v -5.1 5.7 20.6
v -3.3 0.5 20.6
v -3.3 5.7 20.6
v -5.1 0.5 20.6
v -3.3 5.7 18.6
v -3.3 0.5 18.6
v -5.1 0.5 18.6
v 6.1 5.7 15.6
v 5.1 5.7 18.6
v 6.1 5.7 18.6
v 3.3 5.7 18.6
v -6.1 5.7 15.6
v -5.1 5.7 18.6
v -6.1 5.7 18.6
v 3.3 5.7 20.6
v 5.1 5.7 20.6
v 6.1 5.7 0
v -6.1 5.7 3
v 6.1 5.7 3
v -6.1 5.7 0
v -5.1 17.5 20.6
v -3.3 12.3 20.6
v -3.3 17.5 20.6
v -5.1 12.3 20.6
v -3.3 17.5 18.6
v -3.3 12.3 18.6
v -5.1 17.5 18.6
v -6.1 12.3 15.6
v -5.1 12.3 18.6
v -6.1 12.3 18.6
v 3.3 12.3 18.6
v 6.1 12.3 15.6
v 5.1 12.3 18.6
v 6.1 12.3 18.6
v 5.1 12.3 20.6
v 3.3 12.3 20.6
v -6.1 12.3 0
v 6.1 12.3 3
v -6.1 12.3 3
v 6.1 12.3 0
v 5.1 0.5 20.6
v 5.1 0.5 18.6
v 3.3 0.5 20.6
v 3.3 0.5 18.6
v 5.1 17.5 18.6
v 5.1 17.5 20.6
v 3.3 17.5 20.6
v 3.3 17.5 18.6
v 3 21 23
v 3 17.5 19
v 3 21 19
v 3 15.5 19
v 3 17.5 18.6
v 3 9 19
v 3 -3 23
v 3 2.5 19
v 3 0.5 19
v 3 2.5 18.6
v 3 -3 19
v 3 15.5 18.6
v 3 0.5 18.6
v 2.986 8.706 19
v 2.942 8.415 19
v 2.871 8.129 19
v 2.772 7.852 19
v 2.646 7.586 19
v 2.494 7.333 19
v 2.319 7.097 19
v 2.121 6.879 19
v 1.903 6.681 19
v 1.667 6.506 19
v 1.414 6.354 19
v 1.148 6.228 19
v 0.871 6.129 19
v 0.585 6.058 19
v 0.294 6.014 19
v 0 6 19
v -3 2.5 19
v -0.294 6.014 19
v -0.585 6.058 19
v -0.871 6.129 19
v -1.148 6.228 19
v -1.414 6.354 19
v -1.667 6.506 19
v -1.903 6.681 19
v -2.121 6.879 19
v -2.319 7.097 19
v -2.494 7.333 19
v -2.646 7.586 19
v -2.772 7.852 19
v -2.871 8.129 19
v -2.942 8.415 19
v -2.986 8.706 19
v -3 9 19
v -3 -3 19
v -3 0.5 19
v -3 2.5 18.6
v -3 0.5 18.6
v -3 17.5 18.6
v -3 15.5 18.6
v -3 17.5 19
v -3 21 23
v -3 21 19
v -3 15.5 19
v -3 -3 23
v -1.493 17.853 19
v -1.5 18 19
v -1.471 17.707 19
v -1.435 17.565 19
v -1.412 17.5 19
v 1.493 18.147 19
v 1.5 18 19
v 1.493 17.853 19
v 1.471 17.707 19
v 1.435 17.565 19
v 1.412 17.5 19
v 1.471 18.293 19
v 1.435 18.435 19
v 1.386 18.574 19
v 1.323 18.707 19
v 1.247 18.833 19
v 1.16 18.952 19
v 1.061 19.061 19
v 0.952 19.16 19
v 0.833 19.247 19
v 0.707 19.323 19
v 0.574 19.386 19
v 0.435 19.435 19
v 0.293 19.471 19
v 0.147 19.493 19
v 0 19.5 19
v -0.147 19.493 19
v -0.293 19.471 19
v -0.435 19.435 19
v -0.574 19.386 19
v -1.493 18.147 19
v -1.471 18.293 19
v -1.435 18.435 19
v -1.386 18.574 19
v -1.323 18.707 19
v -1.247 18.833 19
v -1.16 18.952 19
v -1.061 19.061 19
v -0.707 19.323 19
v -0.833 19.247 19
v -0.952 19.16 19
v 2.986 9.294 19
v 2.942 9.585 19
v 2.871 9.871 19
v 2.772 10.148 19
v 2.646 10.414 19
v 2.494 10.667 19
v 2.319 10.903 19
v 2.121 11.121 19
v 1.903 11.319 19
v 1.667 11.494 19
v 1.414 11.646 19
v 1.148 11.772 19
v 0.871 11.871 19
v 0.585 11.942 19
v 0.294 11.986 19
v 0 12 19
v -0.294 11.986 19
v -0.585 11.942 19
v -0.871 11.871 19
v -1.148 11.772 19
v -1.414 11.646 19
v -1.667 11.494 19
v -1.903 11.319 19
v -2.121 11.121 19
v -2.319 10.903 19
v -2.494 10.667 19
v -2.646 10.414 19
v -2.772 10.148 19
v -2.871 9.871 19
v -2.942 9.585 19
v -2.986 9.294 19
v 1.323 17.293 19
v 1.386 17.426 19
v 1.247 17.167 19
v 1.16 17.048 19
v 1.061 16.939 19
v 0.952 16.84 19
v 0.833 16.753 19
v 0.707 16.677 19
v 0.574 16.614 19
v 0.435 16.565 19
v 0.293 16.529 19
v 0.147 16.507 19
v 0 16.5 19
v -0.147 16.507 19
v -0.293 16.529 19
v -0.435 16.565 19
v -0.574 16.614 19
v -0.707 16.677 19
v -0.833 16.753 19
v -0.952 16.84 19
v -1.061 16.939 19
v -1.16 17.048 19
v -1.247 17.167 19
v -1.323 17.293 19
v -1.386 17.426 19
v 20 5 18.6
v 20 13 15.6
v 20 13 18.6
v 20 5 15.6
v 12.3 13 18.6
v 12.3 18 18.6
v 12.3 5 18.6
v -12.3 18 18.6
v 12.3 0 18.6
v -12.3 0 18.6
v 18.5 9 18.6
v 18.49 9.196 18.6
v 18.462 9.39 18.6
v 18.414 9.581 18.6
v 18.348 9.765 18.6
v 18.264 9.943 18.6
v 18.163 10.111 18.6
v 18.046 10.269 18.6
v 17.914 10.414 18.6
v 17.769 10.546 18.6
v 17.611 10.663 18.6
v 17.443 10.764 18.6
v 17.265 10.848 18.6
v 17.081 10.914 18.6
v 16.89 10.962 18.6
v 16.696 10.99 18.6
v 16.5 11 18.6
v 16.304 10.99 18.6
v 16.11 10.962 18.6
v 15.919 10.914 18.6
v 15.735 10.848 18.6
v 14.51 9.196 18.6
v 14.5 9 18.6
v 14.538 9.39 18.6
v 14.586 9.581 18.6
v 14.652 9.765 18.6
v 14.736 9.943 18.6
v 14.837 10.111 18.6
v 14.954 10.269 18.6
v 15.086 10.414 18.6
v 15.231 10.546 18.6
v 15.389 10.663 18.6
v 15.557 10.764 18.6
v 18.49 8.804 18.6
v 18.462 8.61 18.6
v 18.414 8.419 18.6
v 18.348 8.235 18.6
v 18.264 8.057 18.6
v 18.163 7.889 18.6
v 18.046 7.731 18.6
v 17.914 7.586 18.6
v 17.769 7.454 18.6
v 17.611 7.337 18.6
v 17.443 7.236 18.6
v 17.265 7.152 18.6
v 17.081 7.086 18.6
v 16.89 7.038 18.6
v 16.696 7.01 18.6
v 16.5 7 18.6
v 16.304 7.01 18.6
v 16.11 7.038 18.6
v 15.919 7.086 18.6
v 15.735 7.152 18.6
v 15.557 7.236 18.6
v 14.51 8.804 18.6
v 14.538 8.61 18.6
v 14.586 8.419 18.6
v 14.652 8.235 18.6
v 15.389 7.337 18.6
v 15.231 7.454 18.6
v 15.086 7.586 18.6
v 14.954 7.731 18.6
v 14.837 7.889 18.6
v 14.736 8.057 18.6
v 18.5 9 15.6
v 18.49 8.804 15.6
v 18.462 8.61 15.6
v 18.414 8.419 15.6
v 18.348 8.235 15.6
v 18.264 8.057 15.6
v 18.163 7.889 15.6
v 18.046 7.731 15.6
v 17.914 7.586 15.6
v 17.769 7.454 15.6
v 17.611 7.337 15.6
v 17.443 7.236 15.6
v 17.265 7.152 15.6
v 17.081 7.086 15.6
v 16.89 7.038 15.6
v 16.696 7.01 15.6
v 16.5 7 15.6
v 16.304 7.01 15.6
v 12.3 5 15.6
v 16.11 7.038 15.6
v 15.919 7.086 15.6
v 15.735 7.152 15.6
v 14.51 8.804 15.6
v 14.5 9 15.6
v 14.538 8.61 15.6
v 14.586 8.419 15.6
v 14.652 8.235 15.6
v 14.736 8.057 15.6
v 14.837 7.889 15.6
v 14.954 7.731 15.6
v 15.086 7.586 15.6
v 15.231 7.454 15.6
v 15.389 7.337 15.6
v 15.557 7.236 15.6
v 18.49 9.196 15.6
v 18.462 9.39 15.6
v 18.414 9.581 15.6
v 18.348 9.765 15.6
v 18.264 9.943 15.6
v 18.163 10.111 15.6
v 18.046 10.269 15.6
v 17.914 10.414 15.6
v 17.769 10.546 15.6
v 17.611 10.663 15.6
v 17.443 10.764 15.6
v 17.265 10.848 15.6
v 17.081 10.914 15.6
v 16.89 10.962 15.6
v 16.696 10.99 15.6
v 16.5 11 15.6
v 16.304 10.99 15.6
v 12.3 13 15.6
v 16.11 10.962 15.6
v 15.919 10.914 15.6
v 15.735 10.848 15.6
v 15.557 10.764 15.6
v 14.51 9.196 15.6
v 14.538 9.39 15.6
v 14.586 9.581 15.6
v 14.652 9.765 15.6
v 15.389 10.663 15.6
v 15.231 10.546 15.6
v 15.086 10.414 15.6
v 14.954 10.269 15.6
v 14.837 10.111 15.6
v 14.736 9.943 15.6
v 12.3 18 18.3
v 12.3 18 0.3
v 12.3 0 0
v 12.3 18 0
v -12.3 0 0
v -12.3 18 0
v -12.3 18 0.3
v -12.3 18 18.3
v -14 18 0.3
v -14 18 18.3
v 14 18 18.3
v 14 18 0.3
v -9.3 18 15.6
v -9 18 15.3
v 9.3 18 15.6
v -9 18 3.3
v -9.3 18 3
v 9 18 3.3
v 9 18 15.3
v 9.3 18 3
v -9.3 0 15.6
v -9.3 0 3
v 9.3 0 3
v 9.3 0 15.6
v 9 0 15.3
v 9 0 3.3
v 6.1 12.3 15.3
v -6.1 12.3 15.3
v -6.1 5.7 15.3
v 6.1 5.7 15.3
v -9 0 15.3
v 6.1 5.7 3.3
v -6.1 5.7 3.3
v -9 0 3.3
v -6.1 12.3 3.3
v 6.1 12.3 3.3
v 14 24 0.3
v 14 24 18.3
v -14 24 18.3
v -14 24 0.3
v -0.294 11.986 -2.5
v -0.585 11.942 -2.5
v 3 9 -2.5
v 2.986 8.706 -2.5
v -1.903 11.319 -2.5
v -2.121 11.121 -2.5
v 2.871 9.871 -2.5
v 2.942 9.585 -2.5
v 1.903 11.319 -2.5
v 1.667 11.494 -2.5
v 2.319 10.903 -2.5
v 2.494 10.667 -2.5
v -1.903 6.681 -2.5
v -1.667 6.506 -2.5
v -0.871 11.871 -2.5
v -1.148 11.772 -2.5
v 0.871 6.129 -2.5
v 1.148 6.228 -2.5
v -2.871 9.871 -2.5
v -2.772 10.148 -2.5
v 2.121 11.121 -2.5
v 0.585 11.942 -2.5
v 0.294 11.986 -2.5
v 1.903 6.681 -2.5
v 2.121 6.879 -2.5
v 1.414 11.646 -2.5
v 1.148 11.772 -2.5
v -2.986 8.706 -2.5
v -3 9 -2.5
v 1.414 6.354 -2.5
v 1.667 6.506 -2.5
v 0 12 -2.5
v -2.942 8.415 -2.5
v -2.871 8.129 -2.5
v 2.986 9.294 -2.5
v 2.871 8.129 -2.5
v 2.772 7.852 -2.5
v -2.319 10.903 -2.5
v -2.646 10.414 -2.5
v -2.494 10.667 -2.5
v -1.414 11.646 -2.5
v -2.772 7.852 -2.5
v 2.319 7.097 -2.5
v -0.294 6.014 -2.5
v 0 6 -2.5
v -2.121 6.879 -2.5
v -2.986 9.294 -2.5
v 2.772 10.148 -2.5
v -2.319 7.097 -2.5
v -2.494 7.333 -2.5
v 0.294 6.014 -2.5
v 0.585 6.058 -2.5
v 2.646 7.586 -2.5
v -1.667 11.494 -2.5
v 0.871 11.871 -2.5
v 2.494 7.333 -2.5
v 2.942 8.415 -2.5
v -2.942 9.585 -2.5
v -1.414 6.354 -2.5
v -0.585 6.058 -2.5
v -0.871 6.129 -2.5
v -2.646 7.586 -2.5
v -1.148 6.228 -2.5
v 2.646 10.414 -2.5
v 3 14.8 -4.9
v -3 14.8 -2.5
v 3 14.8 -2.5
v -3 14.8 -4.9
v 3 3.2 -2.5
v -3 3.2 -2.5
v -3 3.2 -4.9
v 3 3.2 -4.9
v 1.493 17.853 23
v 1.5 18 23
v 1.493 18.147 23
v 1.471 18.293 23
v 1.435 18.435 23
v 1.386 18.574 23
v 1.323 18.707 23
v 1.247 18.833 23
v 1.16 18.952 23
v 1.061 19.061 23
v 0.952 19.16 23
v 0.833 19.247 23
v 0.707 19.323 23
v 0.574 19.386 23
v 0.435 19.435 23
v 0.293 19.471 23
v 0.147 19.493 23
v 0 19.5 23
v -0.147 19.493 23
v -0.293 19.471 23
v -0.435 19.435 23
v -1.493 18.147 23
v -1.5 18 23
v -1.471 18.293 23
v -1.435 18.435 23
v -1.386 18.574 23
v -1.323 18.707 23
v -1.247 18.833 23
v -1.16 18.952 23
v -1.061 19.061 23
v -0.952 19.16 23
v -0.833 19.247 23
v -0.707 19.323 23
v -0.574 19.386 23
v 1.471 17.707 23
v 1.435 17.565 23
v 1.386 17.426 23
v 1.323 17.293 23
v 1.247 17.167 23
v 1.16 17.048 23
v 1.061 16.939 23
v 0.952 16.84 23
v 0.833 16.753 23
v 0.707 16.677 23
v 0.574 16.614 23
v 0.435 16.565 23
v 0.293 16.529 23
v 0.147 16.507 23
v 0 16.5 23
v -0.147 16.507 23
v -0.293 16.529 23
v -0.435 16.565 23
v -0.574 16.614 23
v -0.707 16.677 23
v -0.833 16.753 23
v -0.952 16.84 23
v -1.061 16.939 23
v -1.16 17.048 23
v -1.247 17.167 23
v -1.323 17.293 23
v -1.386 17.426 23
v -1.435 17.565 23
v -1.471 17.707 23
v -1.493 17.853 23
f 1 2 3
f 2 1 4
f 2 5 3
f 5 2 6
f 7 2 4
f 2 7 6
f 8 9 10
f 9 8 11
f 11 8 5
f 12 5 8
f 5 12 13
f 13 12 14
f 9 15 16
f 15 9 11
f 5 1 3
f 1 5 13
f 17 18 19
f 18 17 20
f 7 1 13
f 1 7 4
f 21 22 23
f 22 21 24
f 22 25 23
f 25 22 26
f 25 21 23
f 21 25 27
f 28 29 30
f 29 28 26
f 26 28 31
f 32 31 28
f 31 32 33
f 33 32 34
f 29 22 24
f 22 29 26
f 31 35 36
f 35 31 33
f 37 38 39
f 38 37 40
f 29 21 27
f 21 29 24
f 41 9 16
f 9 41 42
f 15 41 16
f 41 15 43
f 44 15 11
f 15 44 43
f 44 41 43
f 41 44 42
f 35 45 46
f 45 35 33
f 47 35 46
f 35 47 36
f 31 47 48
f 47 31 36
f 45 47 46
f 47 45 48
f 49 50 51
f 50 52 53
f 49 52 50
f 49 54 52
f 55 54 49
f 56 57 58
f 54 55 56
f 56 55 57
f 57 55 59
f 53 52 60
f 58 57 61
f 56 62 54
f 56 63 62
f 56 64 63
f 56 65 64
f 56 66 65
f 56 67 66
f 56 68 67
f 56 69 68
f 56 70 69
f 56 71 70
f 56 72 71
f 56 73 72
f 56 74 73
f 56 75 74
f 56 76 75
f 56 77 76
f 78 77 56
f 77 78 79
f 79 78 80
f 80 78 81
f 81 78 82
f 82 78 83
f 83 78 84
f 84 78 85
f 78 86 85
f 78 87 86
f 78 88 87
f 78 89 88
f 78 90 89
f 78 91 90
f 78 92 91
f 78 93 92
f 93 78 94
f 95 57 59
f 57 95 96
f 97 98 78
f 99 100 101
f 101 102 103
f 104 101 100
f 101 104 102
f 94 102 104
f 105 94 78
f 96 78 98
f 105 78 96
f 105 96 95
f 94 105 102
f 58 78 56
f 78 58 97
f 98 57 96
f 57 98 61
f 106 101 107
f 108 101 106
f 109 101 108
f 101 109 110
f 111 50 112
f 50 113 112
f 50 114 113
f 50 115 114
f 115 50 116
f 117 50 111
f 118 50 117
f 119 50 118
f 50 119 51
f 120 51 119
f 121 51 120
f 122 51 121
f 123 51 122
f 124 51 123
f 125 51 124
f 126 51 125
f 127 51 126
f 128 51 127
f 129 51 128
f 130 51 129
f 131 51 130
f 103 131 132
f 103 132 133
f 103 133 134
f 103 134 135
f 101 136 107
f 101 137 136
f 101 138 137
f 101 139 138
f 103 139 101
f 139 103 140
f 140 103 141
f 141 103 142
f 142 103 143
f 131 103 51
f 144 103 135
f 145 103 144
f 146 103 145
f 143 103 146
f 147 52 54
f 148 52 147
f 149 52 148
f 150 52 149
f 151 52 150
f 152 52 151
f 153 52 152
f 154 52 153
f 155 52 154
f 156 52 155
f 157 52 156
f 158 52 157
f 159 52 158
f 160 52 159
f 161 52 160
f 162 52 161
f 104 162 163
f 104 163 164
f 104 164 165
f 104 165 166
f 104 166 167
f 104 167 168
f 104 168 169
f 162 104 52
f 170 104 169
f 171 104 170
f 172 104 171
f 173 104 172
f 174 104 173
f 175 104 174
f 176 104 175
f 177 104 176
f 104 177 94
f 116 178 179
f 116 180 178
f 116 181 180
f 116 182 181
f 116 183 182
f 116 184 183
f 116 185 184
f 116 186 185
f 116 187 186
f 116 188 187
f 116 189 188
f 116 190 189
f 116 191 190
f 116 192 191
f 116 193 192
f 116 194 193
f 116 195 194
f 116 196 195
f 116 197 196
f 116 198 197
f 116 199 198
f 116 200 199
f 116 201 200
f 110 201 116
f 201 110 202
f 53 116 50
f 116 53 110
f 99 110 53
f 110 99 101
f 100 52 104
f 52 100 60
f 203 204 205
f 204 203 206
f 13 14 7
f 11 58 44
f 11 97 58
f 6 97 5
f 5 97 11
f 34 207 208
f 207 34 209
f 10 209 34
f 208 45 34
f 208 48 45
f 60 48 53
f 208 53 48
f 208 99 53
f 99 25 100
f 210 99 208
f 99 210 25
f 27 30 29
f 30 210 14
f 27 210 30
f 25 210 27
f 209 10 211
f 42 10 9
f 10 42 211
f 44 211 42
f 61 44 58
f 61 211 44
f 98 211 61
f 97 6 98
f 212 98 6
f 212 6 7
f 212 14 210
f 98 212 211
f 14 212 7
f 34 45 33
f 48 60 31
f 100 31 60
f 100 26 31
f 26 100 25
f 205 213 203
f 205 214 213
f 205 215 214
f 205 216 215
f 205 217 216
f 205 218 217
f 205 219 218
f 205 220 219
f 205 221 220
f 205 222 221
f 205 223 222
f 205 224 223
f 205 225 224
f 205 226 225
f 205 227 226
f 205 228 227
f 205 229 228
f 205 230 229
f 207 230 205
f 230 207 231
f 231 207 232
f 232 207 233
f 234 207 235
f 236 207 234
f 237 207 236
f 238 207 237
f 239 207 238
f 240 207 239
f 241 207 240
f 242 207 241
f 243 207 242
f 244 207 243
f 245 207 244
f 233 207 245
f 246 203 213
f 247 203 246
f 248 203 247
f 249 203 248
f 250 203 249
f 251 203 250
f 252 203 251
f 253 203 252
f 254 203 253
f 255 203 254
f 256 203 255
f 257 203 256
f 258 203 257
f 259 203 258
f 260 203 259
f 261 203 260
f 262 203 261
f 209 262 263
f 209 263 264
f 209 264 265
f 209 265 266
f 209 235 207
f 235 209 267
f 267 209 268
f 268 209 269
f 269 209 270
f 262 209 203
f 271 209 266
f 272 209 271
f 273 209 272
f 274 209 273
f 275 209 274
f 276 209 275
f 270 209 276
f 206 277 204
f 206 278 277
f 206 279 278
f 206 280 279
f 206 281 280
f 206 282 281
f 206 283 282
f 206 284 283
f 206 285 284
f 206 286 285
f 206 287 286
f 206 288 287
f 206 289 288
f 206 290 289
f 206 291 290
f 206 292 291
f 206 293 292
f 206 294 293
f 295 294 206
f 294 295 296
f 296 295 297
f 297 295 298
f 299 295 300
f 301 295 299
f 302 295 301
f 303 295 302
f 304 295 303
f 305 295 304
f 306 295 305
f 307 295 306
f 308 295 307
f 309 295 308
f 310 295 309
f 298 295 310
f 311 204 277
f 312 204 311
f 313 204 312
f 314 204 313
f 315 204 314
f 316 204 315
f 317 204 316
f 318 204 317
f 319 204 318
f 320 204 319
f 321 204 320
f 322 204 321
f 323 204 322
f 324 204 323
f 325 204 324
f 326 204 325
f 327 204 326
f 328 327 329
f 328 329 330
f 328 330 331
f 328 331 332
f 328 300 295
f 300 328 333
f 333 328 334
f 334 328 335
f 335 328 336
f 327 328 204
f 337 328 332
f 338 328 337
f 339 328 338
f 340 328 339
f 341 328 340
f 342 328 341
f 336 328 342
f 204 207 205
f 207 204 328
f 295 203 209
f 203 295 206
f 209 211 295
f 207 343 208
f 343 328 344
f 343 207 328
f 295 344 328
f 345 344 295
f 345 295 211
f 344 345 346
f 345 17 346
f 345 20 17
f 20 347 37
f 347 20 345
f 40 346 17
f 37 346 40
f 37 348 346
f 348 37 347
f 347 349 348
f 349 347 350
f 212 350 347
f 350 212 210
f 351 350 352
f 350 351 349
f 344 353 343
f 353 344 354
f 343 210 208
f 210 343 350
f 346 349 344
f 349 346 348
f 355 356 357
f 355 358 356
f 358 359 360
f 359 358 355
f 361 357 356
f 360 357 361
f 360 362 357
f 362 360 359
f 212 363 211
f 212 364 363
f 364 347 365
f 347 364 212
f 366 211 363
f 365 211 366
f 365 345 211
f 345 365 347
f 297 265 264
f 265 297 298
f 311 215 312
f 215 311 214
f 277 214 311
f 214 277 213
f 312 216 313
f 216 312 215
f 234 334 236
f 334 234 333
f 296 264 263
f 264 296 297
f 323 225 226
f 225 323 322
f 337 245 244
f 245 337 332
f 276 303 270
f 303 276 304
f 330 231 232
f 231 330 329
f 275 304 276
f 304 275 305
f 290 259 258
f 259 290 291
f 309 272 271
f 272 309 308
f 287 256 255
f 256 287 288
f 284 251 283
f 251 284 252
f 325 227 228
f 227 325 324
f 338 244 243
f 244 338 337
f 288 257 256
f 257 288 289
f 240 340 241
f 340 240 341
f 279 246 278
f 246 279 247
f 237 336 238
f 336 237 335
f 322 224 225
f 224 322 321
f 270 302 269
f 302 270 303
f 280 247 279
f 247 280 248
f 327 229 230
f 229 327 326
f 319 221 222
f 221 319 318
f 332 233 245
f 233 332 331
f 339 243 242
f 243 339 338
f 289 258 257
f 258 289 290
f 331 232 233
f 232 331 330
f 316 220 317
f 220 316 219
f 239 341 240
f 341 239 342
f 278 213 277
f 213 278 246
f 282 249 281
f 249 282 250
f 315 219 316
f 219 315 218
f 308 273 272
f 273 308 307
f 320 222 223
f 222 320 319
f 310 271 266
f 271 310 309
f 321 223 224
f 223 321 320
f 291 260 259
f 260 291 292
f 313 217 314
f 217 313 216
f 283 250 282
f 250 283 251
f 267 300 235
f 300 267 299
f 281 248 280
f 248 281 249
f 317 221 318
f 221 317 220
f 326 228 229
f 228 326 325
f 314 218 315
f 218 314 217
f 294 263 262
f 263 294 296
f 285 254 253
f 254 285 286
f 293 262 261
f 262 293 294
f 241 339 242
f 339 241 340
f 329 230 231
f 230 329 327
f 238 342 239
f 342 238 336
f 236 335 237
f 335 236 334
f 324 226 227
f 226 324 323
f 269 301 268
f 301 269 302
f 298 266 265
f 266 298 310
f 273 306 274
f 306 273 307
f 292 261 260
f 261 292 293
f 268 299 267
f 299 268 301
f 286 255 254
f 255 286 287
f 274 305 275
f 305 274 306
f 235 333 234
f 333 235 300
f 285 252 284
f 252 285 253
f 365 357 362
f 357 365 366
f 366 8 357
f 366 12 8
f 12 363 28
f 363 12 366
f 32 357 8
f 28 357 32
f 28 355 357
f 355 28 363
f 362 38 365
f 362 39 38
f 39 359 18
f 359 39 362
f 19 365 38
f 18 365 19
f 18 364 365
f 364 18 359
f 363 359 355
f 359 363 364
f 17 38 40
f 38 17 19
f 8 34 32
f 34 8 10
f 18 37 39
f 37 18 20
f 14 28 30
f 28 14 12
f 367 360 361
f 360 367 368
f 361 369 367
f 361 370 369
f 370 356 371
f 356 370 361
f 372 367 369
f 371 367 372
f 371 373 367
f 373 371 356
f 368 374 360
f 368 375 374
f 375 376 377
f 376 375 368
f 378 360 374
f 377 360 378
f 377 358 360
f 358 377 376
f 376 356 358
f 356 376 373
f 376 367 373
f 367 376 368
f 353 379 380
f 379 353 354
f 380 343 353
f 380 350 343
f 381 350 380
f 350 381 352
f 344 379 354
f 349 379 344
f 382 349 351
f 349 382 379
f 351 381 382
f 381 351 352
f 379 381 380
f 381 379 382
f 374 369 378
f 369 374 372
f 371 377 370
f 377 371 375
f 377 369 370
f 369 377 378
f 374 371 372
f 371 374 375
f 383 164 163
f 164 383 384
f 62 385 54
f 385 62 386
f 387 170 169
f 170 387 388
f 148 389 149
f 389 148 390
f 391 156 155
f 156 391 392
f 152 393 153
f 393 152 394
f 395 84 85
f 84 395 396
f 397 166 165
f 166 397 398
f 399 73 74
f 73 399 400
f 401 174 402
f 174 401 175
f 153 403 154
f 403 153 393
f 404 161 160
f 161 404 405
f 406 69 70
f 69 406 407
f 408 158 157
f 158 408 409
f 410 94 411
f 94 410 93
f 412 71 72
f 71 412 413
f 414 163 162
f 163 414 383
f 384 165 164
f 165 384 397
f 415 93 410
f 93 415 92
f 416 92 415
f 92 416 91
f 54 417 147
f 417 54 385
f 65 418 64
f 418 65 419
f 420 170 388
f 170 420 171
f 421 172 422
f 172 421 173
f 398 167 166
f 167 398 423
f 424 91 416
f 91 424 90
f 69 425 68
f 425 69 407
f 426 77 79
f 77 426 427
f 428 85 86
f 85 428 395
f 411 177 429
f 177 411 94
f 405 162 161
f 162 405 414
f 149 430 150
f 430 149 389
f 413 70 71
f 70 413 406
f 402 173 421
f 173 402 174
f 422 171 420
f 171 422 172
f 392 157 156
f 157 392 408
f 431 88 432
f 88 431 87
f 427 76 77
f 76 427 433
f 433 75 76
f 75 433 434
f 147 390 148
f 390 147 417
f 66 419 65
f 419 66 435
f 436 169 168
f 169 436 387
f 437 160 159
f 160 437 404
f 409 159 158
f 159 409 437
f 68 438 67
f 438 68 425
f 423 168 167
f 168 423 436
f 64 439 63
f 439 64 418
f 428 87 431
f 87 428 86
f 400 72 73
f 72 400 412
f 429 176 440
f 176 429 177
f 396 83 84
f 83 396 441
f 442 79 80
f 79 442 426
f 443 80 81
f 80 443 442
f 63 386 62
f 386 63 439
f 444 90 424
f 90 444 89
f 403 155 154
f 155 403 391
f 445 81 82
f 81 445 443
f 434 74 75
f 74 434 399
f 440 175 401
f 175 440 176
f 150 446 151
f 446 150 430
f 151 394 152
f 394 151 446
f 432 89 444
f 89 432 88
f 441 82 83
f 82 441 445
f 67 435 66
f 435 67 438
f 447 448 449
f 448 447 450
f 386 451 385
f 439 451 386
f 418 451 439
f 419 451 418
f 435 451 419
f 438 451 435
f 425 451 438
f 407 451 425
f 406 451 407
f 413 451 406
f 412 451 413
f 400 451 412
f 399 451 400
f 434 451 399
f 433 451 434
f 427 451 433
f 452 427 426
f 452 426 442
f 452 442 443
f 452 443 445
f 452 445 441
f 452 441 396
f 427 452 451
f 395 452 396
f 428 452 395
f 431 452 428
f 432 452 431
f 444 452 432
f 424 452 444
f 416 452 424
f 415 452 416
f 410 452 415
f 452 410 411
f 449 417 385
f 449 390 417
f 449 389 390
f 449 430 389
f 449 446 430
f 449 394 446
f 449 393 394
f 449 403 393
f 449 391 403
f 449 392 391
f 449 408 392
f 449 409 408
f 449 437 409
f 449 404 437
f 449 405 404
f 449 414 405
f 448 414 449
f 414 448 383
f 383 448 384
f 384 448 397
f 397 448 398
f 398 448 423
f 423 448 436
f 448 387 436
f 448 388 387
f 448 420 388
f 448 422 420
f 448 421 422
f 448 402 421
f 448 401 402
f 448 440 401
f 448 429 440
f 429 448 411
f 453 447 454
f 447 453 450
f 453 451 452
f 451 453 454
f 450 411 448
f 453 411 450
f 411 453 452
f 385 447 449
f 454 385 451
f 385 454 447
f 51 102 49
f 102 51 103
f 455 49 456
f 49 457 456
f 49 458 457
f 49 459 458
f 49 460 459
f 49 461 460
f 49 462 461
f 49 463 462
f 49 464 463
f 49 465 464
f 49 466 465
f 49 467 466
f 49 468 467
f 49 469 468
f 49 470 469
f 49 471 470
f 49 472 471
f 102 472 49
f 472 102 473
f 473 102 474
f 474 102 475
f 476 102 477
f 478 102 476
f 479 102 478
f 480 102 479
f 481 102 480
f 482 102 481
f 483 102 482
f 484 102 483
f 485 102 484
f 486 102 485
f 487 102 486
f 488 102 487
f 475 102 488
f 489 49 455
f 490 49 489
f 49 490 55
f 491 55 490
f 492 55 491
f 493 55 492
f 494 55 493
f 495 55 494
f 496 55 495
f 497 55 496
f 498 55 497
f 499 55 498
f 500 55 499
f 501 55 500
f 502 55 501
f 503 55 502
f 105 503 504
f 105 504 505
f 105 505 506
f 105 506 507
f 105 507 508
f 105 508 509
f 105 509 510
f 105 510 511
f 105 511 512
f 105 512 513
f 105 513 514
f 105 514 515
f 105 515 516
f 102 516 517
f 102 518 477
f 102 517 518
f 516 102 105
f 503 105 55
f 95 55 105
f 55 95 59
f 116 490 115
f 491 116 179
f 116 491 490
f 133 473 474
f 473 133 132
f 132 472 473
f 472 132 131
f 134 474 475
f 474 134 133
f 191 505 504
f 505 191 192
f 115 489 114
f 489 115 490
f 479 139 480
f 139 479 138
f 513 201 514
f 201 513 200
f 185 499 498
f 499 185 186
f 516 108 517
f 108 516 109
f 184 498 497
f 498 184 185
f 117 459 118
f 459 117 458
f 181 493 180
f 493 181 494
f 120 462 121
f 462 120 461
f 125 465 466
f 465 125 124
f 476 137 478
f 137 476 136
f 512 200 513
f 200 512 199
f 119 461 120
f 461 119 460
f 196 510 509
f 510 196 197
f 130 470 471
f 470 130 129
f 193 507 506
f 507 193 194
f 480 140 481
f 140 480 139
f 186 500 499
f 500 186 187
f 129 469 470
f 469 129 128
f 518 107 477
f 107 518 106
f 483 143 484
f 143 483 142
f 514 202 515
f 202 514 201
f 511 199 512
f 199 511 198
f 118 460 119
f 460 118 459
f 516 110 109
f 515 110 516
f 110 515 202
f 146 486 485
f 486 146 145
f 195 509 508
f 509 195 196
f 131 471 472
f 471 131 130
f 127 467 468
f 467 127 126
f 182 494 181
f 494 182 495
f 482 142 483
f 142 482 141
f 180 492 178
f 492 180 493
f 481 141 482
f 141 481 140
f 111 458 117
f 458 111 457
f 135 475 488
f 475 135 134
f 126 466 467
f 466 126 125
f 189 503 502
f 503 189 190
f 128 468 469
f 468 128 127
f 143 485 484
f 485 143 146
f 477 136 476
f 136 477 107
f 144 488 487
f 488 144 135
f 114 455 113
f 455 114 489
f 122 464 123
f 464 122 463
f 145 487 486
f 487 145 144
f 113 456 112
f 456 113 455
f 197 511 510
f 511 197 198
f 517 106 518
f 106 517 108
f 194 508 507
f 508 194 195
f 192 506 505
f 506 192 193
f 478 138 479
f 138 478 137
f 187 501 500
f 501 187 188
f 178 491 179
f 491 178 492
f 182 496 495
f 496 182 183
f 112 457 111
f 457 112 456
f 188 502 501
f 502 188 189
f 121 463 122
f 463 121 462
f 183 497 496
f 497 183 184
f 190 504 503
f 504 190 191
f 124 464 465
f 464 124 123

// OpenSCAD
// V8B TETHER-EYELET COUPON ONLY. V7 rear connection retired after stuck/broken key.
// All PLA. No full support or brace revision is released by this file.
// Nominal values are trial fits, not empirically calibrated.
part="assembly"; // receiver, tongue, keeper, assembly, unlocked, exploded
$fn=64;
// Assembly coordinates: X across brace, Y tongue insertion, Z vertical.
// Receiver Y=0..18; tongue withdraws toward +Y. Keeper axis is Z.
receiver_w=24.6; receiver_l=18; receiver_h=18.6;
tongue_w=18; tongue_h=12; tongue_l=18;
slide_clearance=.3; // EACH FACE, total .6 mm in X and Z
keyhole_x=12.2;keyhole_y=6.6;
shaft_d=6; key_foot_x=11.6; key_foot_y=6;
head_z=19; head_top=23; lift=1.8;
module box(a,b){translate(a)cube(b-a);}
module receiver(){difference(){union(){
 // Added eyelet outside the socket; no cut into tongue bearing walls.
 box([11.8,5,15.6],[20,13,18.6]);
 box([-receiver_w/2,0,0],[receiver_w/2,receiver_l,receiver_h]);
 // Four open indexing posts. LOCKED handle runs along Y between X posts.
 for(sx=[-1,1])for(sy=[-1,1])translate([0,9,0])scale([sx,sy,1])
  box([3.3,3.3,18.4],[5.1,8.5,20.6]);
 // Small seats support the underside of the locked handle at z=19.
 for(sy=[-1,1])translate([0,9,0])scale([1,sy,1])
  box([-3,6.5,18.4],[3,8.5,19]);
}
 translate([16.5,9,15.5])cylinder(d=4,h=3.2);
 // Open through both ends: no blind end to wedge against.
 box([-tongue_w/2-slide_clearance,-.1,3],[tongue_w/2+slide_clearance,18.1,3+tongue_h+2*slide_clearance]);
 box([-keyhole_x/2,9-keyhole_y/2,-.1],[keyhole_x/2,9+keyhole_y/2,24]);
}}
module tongue(){difference(){union(){
 box([-9,0,3.3],[9,18.2,15.3]);
 box([-14,18,.3],[14,24,18.3]); // exposed pad represents rear-brace panel
}
 box([-keyhole_x/2,9-keyhole_y/2,3.2],[keyhole_x/2,9+keyhole_y/2,15.4]);
}}
// Unlocked keeper: foot and handle long axis X. Rotate +90 deg about Z to lock.
// Printed lying flat: all head/foot faces share Y=-3, no elevated grip overhang.
module keeper(){difference(){union(){
 translate([0,9,-2.7])cylinder(d=shaft_d,h=head_z+2.9);
 box([-key_foot_x/2,9-key_foot_y/2,-4.9],[key_foot_x/2,9+key_foot_y/2,-2.5]);
 box([-12,6,head_z],[12,12,head_top]);
}
 // Tether eye in handle tip, away from the load-bearing shaft.
 translate([9,9,18.9])cylinder(d=3,h=4.2);
}}
module turn_key(angle=90,dz=0){translate([0,9,dz])rotate([0,0,angle])translate([0,-9,0])keeper();}
module receiver_print(){multmatrix([[0,1,0,0],[0,0,1,0],[1,0,0,12.3],[0,0,0,1]])receiver();}
module tongue_print(){multmatrix([[1,0,0,14],[0,0,1,-.3],[0,-1,0,24],[0,0,0,1]])tongue();}
module keeper_print(){multmatrix([[0,0,1,4.9],[1,0,0,12],[0,1,0,-6],[0,0,0,1]])keeper();}
if(part=="receiver")receiver_print();
else if(part=="tongue")tongue_print();
else if(part=="keeper")keeper_print();
else if(part=="assembly"){
 color("silver")receiver();color("steelblue")tongue();color("orange")turn_key();
} else if(part=="unlocked"){
 color("silver")receiver();color("steelblue")tongue();color("orange")turn_key(0,lift);
} else if(part=="exploded"){
 color("silver")receiver();color("steelblue")translate([0,30,0])tongue();color("orange")turn_key(0,32);
} else assert(false,"Unknown selector");
